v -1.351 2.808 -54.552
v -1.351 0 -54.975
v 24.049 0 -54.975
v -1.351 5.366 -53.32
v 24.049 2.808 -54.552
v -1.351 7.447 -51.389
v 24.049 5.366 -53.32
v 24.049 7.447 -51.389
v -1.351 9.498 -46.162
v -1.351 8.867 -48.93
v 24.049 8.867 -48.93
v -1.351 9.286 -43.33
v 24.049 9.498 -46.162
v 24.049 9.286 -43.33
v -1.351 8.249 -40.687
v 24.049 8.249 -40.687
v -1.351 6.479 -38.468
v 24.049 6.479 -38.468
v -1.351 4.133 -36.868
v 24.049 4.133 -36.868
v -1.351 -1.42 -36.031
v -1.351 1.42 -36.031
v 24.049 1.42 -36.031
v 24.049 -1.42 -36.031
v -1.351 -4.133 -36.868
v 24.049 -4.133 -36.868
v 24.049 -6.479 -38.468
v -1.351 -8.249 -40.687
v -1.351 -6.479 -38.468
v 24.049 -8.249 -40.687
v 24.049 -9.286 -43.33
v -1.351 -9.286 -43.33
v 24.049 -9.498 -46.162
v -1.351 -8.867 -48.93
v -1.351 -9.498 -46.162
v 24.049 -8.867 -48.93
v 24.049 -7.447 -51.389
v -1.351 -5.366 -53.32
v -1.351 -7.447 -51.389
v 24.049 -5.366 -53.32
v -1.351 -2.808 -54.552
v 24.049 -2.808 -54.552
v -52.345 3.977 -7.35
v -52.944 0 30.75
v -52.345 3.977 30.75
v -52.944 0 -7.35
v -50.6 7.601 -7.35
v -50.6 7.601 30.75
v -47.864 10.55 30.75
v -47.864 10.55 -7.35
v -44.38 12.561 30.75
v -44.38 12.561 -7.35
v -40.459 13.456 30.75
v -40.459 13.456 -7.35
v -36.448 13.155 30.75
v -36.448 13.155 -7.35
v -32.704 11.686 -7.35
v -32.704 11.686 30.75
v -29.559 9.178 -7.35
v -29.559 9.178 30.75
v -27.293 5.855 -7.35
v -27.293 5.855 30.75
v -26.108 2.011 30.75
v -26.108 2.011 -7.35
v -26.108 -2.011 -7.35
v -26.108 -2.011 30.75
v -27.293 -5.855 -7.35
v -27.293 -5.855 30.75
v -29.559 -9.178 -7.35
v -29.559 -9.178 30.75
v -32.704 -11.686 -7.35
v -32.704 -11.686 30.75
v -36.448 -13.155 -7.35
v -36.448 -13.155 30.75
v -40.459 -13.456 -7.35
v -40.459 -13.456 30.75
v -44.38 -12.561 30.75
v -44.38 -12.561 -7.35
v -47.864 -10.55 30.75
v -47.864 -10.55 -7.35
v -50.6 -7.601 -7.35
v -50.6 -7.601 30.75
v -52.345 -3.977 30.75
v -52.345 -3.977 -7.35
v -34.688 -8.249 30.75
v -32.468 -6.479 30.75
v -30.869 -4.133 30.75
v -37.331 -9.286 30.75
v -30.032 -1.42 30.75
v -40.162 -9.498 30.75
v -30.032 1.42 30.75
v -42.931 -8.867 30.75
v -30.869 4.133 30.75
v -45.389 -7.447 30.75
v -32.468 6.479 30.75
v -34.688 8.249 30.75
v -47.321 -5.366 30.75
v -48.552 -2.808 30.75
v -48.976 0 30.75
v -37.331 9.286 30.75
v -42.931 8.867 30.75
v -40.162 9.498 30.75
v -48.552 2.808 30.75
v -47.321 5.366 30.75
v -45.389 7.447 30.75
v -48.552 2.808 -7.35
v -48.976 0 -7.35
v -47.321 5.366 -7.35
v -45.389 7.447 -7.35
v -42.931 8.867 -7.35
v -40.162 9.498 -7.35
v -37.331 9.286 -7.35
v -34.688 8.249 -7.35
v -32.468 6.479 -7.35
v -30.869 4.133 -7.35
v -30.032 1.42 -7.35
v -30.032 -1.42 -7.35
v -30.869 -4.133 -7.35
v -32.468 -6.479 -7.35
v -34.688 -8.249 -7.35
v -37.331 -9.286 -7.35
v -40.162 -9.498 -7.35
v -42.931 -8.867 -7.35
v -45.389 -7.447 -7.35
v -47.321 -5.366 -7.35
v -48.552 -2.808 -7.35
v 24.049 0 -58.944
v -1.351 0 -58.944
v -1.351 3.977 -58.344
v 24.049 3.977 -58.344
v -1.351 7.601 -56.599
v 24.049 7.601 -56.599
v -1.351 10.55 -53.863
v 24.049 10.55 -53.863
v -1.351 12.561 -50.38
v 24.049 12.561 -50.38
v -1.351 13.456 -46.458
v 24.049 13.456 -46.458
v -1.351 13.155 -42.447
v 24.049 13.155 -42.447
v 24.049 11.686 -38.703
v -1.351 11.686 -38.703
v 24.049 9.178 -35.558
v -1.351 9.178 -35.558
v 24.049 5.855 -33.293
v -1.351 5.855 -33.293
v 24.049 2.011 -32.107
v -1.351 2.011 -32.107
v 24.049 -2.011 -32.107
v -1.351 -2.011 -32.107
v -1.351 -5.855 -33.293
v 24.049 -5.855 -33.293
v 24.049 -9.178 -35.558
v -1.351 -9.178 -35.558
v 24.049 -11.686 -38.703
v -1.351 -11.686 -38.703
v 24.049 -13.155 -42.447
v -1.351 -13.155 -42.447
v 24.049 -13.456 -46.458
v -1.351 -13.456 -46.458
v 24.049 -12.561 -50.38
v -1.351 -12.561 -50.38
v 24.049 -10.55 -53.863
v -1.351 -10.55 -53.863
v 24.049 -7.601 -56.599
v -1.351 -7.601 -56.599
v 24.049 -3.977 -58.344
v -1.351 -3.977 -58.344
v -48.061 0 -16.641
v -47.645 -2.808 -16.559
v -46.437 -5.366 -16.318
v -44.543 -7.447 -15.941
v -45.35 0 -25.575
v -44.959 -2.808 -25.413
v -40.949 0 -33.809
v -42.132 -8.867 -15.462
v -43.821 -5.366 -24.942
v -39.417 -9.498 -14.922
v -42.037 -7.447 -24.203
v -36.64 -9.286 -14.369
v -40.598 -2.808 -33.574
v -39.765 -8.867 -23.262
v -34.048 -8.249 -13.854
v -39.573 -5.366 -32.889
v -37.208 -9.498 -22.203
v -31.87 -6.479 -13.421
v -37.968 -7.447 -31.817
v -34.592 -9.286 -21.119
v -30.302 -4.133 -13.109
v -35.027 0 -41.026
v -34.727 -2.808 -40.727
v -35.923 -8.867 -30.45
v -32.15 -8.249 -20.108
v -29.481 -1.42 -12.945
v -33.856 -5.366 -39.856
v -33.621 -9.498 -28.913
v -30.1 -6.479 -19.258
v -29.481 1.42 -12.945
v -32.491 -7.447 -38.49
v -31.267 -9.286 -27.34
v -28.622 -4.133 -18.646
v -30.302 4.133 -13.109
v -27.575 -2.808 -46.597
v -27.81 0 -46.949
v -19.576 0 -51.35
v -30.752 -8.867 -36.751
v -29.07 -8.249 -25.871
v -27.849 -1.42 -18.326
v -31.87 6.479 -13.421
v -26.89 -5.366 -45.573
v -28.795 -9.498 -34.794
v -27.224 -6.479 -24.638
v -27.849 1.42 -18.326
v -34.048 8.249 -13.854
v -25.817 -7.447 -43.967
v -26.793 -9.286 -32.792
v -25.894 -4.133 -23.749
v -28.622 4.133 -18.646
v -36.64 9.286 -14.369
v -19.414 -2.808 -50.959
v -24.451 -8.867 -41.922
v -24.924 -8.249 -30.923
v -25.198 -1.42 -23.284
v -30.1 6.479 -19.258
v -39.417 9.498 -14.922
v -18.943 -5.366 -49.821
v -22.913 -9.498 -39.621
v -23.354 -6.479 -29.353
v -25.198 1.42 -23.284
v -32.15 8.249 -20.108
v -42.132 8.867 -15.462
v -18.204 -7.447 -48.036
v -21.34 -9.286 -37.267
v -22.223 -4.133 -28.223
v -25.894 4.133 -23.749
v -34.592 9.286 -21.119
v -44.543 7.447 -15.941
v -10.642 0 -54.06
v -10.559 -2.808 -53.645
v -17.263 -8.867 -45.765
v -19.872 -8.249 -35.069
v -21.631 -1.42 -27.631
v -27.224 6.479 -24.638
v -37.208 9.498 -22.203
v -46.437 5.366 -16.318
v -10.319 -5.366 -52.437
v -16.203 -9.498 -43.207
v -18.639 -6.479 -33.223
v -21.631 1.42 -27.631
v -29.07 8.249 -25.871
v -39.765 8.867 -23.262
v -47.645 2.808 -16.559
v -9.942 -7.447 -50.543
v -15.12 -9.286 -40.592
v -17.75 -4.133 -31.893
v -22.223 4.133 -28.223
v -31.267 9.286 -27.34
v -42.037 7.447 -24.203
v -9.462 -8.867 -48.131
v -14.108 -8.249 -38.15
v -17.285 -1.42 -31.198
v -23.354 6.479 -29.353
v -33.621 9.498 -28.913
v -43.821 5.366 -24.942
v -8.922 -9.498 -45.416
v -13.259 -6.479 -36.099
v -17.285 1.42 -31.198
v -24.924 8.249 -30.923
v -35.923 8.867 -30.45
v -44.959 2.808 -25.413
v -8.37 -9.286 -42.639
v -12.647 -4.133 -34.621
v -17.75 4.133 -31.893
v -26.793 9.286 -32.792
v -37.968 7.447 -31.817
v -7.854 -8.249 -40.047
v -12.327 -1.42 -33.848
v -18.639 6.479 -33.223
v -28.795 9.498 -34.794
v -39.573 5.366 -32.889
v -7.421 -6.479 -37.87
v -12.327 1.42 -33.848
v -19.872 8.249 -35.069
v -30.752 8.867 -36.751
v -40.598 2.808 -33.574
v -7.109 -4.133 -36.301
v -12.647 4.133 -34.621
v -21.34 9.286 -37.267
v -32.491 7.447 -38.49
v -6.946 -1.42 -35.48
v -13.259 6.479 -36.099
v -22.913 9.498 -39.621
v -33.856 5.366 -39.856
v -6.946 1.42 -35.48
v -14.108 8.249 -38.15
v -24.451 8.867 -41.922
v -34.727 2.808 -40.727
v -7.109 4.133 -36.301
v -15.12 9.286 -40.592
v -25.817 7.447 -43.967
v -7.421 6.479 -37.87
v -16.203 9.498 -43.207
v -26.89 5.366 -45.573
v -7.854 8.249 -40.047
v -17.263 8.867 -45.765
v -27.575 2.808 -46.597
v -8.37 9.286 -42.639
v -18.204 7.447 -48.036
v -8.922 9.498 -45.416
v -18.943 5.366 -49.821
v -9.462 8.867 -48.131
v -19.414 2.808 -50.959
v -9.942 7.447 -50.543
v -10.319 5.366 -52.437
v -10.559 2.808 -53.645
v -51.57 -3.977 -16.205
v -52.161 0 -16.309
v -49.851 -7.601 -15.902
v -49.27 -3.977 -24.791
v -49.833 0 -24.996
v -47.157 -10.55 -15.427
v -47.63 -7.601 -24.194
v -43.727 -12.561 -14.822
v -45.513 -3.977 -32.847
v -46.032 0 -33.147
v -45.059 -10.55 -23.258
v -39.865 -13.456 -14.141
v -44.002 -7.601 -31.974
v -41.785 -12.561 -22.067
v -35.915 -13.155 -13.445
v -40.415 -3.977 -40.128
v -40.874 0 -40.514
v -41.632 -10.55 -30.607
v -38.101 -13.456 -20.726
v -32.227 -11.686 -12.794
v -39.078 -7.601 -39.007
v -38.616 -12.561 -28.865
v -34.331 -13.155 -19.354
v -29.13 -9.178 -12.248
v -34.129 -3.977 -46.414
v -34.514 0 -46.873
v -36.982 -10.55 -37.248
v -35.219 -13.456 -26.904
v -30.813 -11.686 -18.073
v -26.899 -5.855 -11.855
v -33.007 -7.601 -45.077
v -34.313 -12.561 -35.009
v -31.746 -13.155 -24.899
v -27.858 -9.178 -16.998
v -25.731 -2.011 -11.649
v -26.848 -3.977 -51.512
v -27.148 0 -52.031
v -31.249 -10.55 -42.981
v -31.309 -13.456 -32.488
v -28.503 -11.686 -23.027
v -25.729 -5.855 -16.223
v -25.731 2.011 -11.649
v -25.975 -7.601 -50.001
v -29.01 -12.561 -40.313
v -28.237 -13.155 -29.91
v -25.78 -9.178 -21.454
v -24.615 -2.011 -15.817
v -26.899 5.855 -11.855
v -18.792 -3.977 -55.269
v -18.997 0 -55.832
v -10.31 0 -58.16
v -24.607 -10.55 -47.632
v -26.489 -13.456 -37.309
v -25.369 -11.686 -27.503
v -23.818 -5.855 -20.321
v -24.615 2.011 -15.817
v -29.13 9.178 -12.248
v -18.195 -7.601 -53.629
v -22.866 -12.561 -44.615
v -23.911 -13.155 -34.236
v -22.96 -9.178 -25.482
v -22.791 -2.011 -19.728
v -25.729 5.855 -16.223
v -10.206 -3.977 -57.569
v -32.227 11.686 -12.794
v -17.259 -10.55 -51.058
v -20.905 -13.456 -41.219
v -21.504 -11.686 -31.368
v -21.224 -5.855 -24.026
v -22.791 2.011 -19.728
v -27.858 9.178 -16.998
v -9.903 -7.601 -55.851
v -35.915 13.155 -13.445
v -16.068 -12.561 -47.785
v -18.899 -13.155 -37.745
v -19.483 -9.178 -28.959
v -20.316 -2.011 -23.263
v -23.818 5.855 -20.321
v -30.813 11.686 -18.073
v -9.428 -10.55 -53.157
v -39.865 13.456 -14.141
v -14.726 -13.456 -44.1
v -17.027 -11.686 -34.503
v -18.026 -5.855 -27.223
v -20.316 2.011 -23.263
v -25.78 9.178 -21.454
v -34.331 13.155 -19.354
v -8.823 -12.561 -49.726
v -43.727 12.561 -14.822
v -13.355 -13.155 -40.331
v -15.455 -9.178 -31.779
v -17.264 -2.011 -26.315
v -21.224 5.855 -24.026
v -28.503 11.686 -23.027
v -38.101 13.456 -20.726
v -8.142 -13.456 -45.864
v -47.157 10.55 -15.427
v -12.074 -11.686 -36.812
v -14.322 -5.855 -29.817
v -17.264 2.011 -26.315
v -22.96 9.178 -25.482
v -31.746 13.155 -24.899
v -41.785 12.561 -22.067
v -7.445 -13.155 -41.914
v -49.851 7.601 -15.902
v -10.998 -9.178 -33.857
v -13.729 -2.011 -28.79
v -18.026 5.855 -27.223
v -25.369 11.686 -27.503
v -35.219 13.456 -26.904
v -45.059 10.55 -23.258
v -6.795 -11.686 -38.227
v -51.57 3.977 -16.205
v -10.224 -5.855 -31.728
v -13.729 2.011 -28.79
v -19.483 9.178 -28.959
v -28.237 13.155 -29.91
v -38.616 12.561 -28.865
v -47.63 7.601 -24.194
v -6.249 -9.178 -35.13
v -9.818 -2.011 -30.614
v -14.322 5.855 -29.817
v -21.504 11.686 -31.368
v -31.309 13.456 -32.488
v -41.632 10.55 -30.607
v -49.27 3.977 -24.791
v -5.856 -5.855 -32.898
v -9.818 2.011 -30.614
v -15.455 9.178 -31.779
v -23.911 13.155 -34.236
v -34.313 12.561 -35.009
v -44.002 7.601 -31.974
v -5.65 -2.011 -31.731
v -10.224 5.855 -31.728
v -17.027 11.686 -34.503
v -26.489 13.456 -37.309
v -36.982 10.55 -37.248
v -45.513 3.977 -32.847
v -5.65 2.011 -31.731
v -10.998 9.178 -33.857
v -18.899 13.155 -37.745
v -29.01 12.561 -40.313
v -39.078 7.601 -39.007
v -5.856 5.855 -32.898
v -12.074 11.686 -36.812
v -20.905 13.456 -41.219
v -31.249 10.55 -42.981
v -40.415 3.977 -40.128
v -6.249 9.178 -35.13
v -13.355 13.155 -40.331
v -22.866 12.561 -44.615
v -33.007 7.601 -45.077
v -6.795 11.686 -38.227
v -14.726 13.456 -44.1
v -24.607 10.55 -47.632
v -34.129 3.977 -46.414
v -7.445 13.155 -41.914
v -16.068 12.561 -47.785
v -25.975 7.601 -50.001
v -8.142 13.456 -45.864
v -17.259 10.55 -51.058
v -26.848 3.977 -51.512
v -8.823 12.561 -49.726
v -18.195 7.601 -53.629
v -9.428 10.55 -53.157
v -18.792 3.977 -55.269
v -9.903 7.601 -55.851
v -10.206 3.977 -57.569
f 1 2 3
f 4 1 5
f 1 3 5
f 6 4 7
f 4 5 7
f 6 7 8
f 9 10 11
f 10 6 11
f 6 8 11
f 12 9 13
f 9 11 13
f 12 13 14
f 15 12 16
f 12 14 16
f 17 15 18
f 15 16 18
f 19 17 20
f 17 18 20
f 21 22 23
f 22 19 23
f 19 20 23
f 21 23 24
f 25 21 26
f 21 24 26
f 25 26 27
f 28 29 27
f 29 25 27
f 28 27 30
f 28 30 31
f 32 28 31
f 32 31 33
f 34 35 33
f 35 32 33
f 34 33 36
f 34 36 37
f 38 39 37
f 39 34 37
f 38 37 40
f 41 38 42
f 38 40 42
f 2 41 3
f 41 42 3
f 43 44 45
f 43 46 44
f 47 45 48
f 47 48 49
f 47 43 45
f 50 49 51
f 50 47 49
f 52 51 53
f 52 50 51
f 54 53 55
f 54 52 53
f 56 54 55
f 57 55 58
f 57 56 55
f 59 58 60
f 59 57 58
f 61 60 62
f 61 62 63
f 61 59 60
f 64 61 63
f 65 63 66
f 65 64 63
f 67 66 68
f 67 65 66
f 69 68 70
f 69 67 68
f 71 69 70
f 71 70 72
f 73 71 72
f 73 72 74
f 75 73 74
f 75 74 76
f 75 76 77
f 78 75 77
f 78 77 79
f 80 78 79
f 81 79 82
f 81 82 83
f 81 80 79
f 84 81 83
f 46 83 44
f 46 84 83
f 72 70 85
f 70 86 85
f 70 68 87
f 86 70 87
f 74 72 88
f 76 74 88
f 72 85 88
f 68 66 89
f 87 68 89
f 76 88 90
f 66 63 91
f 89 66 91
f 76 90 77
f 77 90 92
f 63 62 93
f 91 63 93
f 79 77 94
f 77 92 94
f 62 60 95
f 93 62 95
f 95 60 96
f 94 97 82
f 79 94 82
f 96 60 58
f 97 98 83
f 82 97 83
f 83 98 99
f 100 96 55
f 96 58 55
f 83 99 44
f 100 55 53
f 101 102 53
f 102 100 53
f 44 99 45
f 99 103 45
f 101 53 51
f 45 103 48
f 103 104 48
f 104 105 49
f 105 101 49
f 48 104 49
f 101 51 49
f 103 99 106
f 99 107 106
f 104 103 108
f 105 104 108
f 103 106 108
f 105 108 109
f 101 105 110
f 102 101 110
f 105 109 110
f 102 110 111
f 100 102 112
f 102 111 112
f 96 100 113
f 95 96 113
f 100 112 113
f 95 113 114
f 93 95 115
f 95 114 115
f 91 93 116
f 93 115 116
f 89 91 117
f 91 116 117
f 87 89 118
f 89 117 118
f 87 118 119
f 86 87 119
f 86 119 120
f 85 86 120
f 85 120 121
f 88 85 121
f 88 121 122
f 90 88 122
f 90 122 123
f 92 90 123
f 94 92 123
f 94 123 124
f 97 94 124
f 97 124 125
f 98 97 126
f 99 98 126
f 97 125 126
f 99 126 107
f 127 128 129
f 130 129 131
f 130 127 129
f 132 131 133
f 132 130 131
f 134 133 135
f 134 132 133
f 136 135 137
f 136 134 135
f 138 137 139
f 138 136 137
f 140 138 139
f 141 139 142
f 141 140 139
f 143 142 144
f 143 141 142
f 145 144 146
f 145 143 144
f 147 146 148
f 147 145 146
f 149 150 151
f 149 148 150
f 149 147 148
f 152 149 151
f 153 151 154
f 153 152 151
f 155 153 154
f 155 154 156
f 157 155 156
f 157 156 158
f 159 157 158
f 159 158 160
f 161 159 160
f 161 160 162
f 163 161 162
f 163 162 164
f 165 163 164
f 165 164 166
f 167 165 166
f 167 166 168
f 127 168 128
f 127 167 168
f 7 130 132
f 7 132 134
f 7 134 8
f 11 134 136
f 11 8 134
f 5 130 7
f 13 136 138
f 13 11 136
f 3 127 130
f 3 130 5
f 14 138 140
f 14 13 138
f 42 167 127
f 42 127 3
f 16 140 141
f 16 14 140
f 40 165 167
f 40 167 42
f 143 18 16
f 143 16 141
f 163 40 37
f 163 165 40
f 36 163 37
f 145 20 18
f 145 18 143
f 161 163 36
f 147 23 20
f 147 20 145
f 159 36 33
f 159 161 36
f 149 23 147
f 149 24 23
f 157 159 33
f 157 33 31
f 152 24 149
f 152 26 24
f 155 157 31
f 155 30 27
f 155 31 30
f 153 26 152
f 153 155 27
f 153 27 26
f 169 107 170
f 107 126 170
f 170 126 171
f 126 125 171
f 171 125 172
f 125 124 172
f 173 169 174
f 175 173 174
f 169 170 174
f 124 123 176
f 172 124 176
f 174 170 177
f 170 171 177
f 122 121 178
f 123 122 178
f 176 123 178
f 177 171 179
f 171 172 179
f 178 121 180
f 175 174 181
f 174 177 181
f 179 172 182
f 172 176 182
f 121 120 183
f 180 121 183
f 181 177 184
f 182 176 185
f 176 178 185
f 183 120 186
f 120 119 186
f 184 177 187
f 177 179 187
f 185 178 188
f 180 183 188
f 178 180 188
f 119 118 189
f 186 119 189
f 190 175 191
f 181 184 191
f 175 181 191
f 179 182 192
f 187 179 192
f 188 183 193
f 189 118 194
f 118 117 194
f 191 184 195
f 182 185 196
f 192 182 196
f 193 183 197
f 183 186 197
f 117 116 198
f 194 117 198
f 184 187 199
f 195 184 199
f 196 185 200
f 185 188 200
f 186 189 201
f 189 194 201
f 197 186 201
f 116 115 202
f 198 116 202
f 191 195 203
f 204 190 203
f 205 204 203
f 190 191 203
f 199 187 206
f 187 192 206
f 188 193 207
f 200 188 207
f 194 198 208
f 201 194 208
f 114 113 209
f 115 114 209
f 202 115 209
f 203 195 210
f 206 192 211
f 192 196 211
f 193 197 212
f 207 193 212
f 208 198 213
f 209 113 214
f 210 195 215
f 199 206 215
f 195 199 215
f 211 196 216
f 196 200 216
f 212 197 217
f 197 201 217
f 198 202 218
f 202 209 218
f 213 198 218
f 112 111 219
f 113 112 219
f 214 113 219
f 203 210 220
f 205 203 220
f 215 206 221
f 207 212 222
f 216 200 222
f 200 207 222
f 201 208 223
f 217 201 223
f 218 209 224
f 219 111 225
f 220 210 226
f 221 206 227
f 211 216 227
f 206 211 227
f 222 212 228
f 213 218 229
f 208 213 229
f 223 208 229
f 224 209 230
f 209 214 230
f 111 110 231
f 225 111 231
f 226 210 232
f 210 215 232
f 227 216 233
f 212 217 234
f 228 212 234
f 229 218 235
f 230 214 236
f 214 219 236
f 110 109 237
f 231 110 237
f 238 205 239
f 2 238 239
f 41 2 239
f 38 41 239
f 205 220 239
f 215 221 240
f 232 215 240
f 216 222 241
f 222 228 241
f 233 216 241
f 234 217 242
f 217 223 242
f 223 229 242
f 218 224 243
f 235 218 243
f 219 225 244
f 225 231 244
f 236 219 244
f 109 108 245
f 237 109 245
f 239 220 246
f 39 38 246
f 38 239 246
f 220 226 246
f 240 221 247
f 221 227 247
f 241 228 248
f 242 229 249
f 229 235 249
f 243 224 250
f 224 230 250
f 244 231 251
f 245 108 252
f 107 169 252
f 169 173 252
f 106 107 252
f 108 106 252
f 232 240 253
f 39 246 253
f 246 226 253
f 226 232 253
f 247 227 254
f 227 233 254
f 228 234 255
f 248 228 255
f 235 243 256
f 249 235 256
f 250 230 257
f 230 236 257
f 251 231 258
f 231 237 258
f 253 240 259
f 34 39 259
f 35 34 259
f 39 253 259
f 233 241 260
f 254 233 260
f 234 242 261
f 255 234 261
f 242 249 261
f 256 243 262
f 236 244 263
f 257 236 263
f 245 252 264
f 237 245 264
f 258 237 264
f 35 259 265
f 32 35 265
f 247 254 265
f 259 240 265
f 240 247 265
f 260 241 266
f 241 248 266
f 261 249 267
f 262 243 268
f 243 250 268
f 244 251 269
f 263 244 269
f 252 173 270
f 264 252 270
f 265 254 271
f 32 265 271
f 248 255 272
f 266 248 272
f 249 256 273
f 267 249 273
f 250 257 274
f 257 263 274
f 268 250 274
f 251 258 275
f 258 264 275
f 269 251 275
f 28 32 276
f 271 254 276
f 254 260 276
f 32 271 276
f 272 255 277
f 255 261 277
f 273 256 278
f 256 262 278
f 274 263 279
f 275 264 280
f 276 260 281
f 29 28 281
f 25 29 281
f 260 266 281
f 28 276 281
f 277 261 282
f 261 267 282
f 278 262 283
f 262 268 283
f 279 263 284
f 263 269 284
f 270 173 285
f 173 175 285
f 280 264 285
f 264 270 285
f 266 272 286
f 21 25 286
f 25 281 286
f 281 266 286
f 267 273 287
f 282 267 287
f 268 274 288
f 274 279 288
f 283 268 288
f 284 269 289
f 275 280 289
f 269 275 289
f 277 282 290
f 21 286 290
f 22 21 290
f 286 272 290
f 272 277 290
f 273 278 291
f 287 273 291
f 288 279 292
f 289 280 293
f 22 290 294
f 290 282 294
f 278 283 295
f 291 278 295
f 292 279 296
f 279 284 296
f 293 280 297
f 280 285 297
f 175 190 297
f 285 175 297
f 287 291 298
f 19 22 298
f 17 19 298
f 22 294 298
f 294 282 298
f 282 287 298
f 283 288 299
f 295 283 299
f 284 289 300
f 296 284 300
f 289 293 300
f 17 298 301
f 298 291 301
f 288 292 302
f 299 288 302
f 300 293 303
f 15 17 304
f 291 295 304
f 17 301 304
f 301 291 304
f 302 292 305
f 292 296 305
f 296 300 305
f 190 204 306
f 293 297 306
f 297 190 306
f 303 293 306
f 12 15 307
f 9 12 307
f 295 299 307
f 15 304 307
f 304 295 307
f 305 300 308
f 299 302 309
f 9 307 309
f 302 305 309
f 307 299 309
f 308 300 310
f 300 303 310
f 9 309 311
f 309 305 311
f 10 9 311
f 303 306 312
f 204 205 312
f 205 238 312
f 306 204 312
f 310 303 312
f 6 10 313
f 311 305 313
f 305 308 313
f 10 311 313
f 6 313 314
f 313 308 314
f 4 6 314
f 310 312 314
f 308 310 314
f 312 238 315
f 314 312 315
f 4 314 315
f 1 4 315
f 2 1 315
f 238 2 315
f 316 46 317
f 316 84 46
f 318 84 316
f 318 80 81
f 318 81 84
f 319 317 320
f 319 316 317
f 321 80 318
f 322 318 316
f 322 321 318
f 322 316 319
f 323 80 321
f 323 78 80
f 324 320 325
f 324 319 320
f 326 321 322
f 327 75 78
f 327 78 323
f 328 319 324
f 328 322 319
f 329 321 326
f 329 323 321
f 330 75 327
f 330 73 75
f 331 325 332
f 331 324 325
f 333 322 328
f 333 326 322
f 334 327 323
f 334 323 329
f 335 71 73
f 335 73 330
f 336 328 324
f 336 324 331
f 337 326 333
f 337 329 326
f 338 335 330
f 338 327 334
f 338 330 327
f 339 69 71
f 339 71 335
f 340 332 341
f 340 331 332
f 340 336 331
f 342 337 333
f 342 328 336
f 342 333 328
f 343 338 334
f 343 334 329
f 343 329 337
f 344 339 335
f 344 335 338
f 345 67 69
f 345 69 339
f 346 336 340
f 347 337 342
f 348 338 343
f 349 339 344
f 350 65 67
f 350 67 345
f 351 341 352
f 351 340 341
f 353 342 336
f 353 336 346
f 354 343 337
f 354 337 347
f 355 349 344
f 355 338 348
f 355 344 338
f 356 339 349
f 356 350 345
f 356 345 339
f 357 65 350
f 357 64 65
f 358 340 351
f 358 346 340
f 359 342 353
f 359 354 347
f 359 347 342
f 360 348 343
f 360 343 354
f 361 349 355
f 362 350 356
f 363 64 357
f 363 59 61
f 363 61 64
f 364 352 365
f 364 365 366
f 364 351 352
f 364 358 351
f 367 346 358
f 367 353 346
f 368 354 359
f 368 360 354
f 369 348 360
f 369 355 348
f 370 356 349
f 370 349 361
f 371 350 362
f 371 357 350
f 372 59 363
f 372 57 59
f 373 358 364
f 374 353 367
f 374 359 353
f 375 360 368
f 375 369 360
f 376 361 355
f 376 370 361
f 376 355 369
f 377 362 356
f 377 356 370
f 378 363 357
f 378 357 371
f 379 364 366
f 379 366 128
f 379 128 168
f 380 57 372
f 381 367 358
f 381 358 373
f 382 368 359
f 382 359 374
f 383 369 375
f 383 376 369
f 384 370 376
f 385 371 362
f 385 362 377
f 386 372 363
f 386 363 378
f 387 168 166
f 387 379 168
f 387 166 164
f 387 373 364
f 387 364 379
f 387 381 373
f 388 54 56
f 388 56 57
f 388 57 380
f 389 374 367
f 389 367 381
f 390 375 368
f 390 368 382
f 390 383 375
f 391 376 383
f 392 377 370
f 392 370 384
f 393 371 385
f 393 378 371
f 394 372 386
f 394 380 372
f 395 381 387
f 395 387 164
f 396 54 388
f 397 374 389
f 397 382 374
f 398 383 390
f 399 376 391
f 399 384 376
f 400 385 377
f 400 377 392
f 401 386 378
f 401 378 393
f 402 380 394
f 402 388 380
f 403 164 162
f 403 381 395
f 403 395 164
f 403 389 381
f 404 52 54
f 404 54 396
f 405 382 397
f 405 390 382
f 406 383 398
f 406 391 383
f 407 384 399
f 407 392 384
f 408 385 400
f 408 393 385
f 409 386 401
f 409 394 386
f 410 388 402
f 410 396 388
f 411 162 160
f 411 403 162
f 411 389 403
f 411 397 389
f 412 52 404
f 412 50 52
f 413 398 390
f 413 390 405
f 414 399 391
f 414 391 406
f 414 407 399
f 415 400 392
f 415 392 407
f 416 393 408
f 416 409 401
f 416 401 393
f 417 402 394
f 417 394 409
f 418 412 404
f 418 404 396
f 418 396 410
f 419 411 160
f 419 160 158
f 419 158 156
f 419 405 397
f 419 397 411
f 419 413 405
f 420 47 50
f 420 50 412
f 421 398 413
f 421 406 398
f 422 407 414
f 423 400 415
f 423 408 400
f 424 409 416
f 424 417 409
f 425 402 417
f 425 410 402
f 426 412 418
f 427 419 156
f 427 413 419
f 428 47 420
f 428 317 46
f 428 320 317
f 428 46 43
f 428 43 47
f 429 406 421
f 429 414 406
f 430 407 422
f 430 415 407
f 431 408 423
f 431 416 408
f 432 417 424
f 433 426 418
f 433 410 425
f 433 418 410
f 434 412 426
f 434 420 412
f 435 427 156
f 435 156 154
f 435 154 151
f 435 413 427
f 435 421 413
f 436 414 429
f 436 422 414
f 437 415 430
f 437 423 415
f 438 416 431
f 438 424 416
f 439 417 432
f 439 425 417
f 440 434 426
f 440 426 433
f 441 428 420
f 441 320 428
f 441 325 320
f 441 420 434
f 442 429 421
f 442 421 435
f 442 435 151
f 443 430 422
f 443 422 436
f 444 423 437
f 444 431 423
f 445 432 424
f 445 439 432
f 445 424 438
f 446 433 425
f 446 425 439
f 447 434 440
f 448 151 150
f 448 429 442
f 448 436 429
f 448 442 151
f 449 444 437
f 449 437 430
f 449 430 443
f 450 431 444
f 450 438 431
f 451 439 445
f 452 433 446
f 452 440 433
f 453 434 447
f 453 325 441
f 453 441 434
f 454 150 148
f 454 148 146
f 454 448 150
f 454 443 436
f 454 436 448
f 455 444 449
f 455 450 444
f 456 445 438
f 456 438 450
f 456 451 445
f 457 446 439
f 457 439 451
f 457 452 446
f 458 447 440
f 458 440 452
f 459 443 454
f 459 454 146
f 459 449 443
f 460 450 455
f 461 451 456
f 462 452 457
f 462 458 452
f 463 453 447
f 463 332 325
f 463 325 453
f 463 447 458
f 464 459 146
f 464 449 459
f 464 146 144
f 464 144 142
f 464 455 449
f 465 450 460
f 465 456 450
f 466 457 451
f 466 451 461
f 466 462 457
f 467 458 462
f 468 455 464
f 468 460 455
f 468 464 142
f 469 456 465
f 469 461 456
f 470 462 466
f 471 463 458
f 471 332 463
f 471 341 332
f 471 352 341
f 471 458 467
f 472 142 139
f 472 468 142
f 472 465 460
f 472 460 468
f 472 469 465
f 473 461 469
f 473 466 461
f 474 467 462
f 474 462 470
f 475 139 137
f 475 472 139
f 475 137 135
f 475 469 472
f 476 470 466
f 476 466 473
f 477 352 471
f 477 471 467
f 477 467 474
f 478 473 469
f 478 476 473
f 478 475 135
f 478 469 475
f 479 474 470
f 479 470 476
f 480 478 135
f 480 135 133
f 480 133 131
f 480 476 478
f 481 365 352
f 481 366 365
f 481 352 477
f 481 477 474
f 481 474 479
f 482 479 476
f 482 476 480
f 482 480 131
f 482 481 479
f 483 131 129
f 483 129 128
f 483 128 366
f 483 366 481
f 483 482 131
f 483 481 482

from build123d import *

# Parameters (mm, degrees)
SWEEP1_PROFILE_R     = 13.49375
CUT_SWEEP1_PROFILE_R = 9.525


with BuildPart() as part:
    # Sweep1: sweep along a curve in space
    with BuildLine() as sweep1_path:
        Line((-39.450636639, 0, 30.750046958), (-39.450636639, 0, 11.700046958))
        Line((-39.450636639, 0, 0), (-39.450636639, 0, 11.700046958))
        Line((-39.450636639, 0, -7.349953042), (-39.450636639, 0, 0))
        ThreePointArc((-39.450636639, 0, -7.349953042), (-28.291405002, 0, -34.290721405), (-1.350636639, 0, -45.449953042))
        Line((-1.350636639, 0, -45.449953042), (24.049363361, 0, -45.449953042))
    # Sweep1 profile (on start of the path) → Sweep1 (sweep)
    with BuildSketch(Plane(origin=(-39.450636639, 0, 30.750046958), x_dir=(-1, 0, 0), z_dir=(0, 0, -1))):
        Circle(SWEEP1_PROFILE_R)
    sweep(path=sweep1_path.line)

    # Cut-Sweep1: sweep along a curve in space
    with BuildLine() as cut_sweep1_path:
        Line((-39.450636639, 0, 30.750046958), (-39.450636639, 0, 11.700046958))
        Line((-39.450636639, 0, 0), (-39.450636639, 0, 11.700046958))
        Line((-39.450636639, 0, -7.349953042), (-39.450636639, 0, 0))
        ThreePointArc((-39.450636639, 0, -7.349953042), (-28.291405002, 0, -34.290721405), (-1.350636639, 0, -45.449953042))
        Line((-1.350636639, 0, -45.449953042), (24.049363361, 0, -45.449953042))
    # Cut-Sweep1 profile (on start of the path) → Cut-Sweep1 (sweep, cut)
    with BuildSketch(Plane(origin=(-39.450636639, 0, 30.750046958), x_dir=(-1, 0, 0), z_dir=(0, 0, -1))):
        Circle(CUT_SWEEP1_PROFILE_R)
    sweep(path=cut_sweep1_path.line, mode=Mode.SUBTRACT)


solid = part.part
